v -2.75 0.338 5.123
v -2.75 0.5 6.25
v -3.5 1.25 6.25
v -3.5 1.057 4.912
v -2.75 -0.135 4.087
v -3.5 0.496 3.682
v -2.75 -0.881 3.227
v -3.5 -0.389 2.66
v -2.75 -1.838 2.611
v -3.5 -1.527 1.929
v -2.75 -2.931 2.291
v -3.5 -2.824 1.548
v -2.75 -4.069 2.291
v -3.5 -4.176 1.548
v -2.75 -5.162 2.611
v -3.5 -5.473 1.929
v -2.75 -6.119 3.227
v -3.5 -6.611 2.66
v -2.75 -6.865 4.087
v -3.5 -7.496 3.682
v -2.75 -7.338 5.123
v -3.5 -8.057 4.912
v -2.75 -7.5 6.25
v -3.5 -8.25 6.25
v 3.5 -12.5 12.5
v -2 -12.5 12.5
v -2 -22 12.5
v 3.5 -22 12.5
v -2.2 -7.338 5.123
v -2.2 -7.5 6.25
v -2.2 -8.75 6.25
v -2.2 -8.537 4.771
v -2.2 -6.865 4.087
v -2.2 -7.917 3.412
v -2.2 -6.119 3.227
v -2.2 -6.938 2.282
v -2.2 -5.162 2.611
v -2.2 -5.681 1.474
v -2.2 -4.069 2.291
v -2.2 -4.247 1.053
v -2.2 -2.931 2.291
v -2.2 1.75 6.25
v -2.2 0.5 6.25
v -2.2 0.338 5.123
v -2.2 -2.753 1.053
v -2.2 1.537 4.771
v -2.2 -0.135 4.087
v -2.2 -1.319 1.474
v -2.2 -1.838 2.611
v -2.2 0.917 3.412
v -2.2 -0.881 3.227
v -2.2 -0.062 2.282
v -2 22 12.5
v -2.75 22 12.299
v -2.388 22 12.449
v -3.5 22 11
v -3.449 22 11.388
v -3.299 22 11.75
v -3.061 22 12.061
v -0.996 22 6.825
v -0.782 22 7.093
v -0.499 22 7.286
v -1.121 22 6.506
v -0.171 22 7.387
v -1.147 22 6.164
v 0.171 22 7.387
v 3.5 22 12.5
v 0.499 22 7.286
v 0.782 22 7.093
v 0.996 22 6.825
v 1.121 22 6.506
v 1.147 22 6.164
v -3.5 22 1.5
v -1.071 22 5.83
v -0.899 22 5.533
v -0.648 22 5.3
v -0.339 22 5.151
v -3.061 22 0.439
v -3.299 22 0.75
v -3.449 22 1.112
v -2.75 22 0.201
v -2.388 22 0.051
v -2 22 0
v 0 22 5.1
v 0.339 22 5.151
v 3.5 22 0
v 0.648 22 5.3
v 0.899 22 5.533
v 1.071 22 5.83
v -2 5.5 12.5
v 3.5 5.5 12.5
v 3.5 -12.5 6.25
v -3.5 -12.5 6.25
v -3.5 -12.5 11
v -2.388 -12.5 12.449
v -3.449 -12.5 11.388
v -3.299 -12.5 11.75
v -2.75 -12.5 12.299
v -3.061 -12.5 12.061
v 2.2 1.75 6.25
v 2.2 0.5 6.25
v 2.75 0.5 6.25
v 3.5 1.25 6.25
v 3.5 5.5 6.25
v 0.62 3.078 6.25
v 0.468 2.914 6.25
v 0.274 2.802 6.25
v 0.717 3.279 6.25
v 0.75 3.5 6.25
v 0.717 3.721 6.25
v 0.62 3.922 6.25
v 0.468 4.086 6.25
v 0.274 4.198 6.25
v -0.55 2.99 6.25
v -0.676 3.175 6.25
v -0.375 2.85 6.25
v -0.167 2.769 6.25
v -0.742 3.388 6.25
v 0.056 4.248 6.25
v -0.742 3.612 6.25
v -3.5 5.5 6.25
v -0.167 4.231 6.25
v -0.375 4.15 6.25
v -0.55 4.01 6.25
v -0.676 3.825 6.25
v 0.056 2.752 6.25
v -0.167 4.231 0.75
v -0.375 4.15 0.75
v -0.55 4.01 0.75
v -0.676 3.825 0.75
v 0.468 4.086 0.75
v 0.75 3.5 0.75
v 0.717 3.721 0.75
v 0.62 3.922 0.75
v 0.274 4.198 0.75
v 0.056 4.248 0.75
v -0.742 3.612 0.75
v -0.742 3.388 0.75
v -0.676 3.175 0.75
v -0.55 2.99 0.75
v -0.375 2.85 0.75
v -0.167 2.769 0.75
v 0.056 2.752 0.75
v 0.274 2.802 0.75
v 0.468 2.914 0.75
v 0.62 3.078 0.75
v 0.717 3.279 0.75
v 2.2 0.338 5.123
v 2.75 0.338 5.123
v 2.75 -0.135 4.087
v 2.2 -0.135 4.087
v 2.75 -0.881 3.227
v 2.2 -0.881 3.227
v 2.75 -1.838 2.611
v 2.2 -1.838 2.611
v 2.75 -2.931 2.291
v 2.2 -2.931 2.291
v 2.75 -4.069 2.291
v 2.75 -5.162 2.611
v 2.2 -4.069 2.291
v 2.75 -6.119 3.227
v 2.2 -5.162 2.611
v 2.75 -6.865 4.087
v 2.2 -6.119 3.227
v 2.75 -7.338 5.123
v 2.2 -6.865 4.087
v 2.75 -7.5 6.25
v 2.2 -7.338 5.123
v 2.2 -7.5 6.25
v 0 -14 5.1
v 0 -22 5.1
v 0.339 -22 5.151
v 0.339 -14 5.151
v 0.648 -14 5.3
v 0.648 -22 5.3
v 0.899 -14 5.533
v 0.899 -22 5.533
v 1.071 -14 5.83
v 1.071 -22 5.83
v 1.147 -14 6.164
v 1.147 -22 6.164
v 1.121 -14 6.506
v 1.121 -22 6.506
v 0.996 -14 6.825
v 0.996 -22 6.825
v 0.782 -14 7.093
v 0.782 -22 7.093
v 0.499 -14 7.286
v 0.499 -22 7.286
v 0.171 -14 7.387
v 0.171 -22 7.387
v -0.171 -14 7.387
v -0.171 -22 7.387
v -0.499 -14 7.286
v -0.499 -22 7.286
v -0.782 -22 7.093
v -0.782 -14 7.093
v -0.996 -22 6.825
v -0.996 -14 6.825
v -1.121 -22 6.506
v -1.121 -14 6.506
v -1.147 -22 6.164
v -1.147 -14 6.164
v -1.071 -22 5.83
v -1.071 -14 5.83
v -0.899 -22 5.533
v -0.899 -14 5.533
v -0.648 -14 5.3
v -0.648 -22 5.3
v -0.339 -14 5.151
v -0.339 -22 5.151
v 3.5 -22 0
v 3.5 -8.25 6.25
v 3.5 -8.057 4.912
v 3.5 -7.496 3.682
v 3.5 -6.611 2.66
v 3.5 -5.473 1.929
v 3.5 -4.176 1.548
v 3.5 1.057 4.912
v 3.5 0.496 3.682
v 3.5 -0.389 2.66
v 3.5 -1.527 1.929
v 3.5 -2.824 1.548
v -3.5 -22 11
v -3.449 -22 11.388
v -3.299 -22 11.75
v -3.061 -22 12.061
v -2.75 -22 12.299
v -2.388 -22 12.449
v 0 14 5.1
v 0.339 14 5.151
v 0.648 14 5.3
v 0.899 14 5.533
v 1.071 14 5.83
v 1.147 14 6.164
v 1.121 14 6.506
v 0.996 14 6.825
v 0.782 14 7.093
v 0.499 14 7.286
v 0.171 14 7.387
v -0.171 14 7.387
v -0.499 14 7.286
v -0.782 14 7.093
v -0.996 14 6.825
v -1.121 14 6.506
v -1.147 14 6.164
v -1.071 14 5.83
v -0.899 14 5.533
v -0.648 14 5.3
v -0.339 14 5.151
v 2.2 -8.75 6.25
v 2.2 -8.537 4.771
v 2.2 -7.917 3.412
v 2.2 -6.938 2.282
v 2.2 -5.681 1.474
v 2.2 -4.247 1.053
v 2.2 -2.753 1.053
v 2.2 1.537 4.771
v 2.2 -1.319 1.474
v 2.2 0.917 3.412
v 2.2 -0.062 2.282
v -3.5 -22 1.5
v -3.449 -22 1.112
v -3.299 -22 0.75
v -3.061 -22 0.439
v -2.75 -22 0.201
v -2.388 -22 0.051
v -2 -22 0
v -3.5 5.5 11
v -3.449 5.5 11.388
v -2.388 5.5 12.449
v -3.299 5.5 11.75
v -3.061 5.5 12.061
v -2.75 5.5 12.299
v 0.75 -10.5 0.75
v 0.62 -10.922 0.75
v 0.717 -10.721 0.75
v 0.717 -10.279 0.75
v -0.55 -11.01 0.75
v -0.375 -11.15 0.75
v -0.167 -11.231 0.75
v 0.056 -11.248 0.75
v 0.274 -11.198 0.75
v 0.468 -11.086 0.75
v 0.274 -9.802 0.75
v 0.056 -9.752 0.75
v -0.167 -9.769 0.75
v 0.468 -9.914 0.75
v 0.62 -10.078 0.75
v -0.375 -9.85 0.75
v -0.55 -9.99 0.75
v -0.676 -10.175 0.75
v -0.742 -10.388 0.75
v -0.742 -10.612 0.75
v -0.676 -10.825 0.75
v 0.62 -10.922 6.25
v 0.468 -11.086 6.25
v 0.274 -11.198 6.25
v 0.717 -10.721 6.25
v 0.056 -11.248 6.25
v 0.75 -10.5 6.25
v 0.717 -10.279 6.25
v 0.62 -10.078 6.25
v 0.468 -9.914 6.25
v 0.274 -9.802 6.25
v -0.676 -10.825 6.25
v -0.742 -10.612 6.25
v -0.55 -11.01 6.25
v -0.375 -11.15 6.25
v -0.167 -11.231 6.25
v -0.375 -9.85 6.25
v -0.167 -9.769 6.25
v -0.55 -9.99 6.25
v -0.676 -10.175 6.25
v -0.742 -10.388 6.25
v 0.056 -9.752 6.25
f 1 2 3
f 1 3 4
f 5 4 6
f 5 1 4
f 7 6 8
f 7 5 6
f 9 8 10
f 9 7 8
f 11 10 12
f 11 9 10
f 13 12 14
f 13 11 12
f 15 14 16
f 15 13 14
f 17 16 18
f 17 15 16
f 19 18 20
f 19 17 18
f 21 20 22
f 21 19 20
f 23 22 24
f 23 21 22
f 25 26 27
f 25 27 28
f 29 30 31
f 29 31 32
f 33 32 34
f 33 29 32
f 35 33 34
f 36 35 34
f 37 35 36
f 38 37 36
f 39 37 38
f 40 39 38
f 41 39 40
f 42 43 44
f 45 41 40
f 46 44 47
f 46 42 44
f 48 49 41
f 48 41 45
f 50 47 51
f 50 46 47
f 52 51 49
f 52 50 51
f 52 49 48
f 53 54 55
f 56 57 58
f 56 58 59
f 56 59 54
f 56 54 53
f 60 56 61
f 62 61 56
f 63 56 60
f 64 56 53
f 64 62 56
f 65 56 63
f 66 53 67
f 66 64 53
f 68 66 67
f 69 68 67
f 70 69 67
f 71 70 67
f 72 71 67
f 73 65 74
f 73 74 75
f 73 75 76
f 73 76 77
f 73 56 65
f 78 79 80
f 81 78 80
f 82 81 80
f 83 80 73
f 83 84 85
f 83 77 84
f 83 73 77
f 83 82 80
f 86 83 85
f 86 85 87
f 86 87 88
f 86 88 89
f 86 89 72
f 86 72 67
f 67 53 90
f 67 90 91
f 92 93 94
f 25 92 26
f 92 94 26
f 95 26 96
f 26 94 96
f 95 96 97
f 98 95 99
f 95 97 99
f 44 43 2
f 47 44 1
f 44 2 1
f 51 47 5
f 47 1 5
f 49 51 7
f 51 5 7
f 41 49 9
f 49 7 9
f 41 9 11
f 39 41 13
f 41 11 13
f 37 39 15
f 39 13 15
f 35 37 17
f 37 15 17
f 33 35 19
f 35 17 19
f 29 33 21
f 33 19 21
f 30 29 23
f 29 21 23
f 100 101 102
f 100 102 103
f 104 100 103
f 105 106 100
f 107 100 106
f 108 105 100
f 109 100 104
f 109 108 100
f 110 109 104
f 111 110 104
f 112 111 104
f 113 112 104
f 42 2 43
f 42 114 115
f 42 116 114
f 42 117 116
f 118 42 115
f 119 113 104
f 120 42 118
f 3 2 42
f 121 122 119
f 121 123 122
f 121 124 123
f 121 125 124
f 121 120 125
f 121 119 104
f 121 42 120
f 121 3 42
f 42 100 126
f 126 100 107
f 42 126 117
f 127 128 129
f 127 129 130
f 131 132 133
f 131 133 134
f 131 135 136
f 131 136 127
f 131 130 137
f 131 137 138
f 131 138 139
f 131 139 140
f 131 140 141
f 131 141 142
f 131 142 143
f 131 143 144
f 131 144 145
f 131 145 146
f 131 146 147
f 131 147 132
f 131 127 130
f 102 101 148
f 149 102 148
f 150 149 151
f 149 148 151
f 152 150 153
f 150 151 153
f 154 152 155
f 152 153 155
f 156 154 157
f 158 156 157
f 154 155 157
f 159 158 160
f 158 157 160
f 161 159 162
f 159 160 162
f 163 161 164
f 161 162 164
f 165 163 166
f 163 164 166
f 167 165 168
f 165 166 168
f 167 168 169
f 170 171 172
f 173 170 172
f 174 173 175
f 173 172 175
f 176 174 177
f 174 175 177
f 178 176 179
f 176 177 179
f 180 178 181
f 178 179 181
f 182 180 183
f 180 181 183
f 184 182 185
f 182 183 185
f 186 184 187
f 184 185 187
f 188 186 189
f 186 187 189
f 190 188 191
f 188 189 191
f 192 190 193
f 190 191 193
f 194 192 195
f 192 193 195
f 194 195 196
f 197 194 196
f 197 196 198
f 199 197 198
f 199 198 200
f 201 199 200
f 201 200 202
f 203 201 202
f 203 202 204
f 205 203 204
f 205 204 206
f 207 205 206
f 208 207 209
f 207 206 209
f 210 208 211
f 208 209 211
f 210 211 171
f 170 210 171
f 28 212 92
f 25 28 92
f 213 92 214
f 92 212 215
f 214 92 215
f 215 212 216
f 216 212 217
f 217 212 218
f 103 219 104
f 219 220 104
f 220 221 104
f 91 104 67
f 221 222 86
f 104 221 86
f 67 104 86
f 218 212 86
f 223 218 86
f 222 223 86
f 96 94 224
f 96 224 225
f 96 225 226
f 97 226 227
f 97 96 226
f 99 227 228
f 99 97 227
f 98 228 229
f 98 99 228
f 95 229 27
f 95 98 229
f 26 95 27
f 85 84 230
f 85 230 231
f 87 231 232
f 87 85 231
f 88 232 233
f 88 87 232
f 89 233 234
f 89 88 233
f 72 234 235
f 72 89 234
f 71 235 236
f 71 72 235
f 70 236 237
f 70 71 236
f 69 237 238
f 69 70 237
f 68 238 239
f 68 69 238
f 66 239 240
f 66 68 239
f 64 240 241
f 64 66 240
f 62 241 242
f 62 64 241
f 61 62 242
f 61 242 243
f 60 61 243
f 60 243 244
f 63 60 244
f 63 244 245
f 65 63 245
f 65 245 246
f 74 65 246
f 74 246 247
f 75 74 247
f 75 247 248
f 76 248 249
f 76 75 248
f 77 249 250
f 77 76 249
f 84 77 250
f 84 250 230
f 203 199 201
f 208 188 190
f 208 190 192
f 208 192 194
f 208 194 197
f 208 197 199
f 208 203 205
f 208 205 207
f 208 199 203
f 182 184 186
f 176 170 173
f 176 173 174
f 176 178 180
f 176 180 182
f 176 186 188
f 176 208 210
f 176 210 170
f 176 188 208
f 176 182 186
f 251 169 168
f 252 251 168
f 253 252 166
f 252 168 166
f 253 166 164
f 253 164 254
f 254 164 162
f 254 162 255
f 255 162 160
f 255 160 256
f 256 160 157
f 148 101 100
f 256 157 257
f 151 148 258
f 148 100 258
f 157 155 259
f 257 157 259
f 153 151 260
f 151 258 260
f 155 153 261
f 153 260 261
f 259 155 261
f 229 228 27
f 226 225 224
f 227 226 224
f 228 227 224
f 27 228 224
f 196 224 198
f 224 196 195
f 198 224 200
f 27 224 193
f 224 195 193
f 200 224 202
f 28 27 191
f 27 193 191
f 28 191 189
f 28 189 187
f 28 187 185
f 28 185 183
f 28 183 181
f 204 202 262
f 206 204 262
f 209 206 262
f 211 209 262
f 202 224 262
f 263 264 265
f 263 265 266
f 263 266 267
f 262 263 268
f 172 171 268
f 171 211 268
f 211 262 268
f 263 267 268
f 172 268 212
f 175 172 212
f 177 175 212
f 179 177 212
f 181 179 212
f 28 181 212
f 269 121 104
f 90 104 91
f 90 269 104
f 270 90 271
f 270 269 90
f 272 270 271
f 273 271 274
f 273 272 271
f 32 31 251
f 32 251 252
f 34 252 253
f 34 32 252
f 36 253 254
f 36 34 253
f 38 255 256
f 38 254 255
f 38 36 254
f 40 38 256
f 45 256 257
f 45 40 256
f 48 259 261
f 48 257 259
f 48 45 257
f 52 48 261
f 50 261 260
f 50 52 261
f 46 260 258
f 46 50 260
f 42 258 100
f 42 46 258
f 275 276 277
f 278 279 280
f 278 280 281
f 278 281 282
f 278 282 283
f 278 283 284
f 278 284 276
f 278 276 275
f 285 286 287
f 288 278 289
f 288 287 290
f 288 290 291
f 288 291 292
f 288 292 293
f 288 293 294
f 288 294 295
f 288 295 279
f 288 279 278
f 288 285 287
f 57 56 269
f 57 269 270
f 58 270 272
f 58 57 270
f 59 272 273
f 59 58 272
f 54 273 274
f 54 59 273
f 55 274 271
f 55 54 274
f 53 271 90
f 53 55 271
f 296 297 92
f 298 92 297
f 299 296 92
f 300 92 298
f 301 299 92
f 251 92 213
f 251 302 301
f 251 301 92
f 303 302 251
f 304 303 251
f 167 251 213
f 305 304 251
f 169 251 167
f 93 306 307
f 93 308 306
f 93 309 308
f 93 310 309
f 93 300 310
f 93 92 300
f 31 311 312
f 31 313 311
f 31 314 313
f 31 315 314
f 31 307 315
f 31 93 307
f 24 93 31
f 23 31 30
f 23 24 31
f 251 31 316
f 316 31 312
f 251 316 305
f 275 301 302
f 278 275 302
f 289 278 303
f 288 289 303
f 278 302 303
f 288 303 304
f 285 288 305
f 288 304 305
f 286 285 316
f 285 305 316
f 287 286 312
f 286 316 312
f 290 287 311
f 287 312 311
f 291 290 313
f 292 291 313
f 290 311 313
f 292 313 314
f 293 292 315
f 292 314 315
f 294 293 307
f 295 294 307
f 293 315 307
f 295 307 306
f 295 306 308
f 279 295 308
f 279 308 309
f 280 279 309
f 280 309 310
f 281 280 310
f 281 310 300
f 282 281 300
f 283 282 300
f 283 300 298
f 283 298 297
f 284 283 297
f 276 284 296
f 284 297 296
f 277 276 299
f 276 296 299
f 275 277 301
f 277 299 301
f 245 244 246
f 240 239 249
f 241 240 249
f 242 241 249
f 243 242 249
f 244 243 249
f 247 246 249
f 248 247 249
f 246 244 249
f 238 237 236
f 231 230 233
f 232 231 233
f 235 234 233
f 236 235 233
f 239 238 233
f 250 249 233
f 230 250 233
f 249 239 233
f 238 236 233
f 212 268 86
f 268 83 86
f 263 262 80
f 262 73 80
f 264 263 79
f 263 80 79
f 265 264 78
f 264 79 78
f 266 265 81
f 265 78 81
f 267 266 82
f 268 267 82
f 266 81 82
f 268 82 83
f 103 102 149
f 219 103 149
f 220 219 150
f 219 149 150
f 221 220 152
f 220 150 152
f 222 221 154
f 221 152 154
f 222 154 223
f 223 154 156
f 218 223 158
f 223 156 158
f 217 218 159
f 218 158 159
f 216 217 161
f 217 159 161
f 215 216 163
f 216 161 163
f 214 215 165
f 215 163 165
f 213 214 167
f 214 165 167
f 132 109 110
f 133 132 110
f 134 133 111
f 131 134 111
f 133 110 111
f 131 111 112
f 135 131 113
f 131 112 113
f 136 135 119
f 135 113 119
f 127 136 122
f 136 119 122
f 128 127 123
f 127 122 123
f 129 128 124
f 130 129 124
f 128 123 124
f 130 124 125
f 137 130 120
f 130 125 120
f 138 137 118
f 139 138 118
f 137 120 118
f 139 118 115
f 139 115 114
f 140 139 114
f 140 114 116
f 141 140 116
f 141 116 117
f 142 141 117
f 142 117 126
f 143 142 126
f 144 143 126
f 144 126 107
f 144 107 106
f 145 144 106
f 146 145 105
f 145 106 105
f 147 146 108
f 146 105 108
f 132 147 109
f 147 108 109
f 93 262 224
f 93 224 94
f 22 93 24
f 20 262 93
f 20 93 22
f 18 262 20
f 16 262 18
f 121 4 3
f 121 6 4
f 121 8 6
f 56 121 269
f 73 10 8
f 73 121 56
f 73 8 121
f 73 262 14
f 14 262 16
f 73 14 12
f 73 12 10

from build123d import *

# Parameters (mm, degrees)
SKETCH_1_W                  = 7
SKETCH_1_H                  = 44
EXTRUDE_485_DEPTH           = 12.5
FILLET_3_R                  = 1.5
CUT_EXTRUDE_1218_REACH      = 28.254
SKETCH_6_R                  = 4
CUT_EXTRUDE_1261_REACH      = 28.254
SKETCH_7_W                  = 6.25
SKETCH_7_H                  = 18
SKETCH_11_R                 = 1.15
CUT_EXTRUDE_1309_DEPTH      = 8
CUT_EXTRUDE_1453_DEPTH      = 2.2
CUT_EXTRUDE_1453_DEPTH_BACK = 2.2
SKETCH_12_R                 = 5.25
SKETCH_13_R                 = 0.75
CUT_EXTRUDE_1751_DEPTH      = 5.5
CHAMFER_1_SIZE              = 0.75


with BuildPart() as part:
    # Эскиз1 → Extrude 485 (new body)
    with BuildSketch(Plane.XY):
        Rectangle(SKETCH_1_W, SKETCH_1_H)
    extrude(amount=EXTRUDE_485_DEPTH)

    # Скругление3
    fillet_3_edges = [part.edges().sort_by_distance(p)[0] for p in [
        (-3.5, 0, 12.5),
        (-3.5, 0, 0),
    ]]
    fillet(fillet_3_edges, radius=FILLET_3_R)

    # Эскиз6 → Cut-Extrude 1218 (cut, up to next)
    with BuildSketch(Plane.ZY.offset(3.5), mode=Mode.PRIVATE) as cut_extrude_1218_sk1:
        with Locations((6.25, -3.5)):
            Circle(SKETCH_6_R)
    cut_extrude_1218_tool1 = extrude(cut_extrude_1218_sk1.sketch, amount=-CUT_EXTRUDE_1218_REACH, mode=Mode.PRIVATE) & part.part
    add(cut_extrude_1218_tool1.solids().sort_by_distance((-3.5, -3.5, 6.25))[0], mode=Mode.SUBTRACT)

    # Эскиз7 → Cut-Extrude 1261 (cut, up to next)
    with BuildSketch(Plane.ZY.offset(3.5), mode=Mode.PRIVATE) as cut_extrude_1261_sk1:
        with Locations((9.375, -3.5)):
            Rectangle(SKETCH_7_W, SKETCH_7_H)
    cut_extrude_1261_tool1 = extrude(cut_extrude_1261_sk1.sketch, amount=-CUT_EXTRUDE_1261_REACH, mode=Mode.PRIVATE) & part.part
    add(cut_extrude_1261_tool1.solids().sort_by_distance((-3.5, -3.5, 9.375))[0], mode=Mode.SUBTRACT)

    # Эскиз11 → Cut-Extrude 1309 (cut)
    with BuildSketch(Plane.XZ.offset(22)):
        with Locations(Location((0, 6.25, 0), (0, 0, 270))):
            Circle(SKETCH_11_R)
    cut_extrude_1309 = extrude(amount=-CUT_EXTRUDE_1309_DEPTH, mode=Mode.SUBTRACT)

    # Mirror 1353: Cut-Extrude 1309 across plane
    add(cut_extrude_1309.mirror(Plane.ZX), mode=Mode.SUBTRACT)

    # Эскиз12 → Cut-Extrude 1453 (cut, two sides: drawn at the far end of the back side and taken through both)
    with BuildSketch(Plane(origin=(0, 0, 0), x_dir=(0, 0, -1), z_dir=(1, 0, 0)).offset(-CUT_EXTRUDE_1453_DEPTH_BACK)):
        with Locations((-6.25, -3.5)):
            Circle(SKETCH_12_R)
    extrude(amount=CUT_EXTRUDE_1453_DEPTH + CUT_EXTRUDE_1453_DEPTH_BACK, mode=Mode.SUBTRACT)

    # Эскиз13 → Cut-Extrude 1751 (cut)
    with BuildSketch(Plane.XY.offset(6.25)):
        with Locations((0, 3.5)):
            Circle(SKETCH_13_R)
        with Locations((0, -10.5)):
            Circle(SKETCH_13_R)
    extrude(amount=-CUT_EXTRUDE_1751_DEPTH, mode=Mode.SUBTRACT)

    # Фаска1
    chamfer_1_edges = [part.edges().sort_by_distance(p)[0] for p in [
        (-3.5, -3.5, 2.25),
        (3.5, -3.5, 2.25),
    ]]
    chamfer(chamfer_1_edges, length=CHAMFER_1_SIZE - 0.0001)  # a hair under: the kernel refuses the full size


solid = part.part
